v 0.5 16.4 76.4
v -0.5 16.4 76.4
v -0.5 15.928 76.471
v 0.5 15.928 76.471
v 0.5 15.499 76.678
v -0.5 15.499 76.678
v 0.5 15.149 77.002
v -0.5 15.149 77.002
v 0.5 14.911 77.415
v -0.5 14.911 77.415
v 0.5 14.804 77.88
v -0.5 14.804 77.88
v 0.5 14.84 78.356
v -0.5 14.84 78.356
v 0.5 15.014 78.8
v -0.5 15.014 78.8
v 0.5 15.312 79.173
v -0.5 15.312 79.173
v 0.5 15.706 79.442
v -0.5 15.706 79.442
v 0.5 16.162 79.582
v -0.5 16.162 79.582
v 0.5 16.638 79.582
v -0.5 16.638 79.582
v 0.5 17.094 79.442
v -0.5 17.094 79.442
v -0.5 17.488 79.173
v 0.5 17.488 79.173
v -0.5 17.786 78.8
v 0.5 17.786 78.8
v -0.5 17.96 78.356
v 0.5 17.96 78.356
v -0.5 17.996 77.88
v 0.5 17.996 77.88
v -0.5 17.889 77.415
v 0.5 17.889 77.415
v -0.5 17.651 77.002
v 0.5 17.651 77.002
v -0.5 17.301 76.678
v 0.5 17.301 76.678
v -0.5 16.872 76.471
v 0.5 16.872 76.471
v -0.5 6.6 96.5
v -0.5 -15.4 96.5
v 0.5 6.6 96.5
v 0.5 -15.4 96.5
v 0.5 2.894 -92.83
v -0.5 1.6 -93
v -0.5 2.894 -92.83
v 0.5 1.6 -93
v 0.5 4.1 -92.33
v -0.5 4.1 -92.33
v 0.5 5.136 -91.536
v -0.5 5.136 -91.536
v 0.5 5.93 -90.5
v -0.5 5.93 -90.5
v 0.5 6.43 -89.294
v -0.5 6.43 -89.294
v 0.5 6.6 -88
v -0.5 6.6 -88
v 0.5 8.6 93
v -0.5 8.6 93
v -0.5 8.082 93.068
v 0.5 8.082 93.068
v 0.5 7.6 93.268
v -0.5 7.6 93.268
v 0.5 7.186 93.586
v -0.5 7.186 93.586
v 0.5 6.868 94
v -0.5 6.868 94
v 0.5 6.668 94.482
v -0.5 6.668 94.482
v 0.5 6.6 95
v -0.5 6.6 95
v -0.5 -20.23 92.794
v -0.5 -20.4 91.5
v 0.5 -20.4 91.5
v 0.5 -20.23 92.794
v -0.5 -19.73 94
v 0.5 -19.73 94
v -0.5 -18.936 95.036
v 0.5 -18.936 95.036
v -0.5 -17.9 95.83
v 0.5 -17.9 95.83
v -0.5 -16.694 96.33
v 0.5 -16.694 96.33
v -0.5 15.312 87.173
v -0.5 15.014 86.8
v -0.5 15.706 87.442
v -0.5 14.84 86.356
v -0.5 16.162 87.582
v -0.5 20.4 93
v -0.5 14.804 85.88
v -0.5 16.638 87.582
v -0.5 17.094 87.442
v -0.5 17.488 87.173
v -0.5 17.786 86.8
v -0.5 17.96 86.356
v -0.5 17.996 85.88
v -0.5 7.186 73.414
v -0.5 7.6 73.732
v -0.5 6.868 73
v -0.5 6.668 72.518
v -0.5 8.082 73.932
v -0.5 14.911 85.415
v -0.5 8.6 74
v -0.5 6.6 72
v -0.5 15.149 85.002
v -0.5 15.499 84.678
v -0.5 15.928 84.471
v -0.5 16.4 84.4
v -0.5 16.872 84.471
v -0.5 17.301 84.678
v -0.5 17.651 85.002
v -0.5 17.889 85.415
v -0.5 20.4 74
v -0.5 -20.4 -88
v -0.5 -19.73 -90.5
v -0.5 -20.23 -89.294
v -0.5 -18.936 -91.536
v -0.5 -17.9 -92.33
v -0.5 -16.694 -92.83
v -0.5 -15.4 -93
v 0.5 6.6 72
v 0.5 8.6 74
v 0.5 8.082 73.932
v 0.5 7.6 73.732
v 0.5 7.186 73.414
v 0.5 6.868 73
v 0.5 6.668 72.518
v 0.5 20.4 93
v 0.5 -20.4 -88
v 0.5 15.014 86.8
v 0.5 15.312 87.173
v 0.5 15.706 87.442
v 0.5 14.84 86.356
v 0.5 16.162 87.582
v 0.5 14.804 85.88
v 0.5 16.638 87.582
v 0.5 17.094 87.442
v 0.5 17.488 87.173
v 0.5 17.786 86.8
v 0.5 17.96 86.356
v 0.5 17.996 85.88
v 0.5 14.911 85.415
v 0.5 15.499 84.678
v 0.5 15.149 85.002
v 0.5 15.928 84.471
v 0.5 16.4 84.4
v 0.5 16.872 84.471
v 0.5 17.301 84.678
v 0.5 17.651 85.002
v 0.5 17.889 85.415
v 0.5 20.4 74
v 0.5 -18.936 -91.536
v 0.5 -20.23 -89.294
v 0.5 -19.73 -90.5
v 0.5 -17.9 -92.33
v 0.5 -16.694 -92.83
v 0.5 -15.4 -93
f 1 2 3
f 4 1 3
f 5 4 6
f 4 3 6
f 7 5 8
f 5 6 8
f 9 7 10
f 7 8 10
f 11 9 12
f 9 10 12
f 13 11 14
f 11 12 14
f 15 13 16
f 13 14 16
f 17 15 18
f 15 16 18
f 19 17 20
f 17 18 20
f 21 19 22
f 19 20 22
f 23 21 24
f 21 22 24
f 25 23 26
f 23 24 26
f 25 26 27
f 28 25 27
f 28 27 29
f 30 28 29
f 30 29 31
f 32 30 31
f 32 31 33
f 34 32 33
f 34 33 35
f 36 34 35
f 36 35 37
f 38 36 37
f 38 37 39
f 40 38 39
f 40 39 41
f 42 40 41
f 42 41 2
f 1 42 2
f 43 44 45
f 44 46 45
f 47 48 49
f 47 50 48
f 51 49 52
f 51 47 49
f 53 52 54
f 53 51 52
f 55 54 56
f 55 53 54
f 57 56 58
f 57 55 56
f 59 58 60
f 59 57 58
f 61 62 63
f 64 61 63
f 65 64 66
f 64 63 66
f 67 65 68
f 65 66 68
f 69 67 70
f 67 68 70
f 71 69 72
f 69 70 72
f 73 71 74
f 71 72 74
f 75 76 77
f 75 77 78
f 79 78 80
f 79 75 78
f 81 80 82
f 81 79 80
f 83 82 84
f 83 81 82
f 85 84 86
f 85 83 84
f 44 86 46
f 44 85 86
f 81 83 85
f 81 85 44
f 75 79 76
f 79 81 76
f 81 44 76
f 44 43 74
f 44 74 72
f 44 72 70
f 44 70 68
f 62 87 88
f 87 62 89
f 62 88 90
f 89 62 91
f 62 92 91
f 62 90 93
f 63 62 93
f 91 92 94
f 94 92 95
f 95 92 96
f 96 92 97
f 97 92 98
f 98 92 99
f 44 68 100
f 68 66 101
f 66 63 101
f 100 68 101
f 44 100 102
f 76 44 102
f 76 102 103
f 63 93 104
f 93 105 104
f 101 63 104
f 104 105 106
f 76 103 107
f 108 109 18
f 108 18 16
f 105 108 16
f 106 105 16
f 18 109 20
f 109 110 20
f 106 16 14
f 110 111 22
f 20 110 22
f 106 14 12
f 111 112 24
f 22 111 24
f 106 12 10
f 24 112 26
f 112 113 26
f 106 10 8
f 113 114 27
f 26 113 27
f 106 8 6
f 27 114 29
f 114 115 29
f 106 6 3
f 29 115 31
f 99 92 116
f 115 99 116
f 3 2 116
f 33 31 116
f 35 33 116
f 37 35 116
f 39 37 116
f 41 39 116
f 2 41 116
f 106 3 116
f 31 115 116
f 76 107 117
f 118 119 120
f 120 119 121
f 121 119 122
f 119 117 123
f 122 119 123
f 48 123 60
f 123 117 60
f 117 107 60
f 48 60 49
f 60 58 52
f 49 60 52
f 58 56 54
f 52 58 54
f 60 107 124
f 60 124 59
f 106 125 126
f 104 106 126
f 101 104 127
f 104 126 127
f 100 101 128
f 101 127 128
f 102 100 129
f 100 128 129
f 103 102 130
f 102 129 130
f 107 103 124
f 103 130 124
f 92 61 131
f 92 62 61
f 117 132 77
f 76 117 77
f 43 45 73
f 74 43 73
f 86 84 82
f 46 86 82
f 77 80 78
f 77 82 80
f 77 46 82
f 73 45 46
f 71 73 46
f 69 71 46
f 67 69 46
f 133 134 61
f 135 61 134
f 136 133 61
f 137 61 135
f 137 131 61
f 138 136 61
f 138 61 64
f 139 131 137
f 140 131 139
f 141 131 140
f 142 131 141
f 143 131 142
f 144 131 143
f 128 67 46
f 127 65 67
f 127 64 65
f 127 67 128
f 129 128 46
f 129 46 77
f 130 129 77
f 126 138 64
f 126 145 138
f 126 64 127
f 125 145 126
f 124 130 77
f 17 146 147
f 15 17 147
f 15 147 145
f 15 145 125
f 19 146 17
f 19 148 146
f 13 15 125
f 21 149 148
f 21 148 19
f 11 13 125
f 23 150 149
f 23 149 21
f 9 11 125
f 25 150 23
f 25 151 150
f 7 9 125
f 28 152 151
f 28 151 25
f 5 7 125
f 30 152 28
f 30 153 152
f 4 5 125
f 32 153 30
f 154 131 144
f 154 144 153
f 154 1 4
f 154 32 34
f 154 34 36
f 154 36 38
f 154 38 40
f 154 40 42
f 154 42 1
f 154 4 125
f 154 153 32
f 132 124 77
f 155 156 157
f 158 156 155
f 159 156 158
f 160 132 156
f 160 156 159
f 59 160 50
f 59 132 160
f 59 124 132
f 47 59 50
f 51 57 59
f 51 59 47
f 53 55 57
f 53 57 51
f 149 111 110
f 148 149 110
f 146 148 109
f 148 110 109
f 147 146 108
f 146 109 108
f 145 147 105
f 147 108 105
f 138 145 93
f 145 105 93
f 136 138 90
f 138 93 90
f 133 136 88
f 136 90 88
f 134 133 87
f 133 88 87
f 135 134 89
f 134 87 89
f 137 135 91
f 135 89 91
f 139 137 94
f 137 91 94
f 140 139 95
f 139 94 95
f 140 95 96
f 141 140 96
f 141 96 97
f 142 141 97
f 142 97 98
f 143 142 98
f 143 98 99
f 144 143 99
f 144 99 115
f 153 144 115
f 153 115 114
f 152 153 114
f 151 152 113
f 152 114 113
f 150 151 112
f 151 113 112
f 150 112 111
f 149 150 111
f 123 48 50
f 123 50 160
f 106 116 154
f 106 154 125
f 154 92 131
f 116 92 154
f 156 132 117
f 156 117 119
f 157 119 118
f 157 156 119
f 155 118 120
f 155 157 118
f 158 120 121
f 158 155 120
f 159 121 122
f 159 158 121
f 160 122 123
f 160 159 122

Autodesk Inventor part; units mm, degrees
ref_plane "YZ Plane" through (0, 0, 0) normal (1, 0, 0) x (0, 1, 0)
ref_plane "XZ Plane" through (0, 0, 0) normal (0, 1, 0) x (-1, 0, 0)
ref_plane "XY Plane" through (0, 0, 0) normal (0, 0, 1) x (1, 0, 0)
sketch "スケッチ1" plane through (0, 0, 0) normal (1, 0, 0) x (0, 1, 0)
  line L0 (-20.4, 93) -> (20.4, 93)
  line L1 (20.4, 93) -> (20.4, -93)
  line L2 (20.4, -93) -> (-20.4, -93)
  line L3 (-20.4, -93) -> (-20.4, 93)
  line L4 (-20.4, 93) -> (20.4, -93) construction
  line L5 (20.4, 93) -> (-20.4, -93) construction
  line L6 (20.4, 93) -> (-20.4, 93)
  line L7 (-20.4, 93) -> (-20.4, 95)
  line L8 (-20.4, 95) -> (20.4, 95)
  line L9 (20.4, 95) -> (20.4, 93)
  point P0 (0, 0)
  dimension "d0" = 40.8
  dimension "d1" = 186
  dimension "d19" = 2
extrude "プレート1" add sketch "スケッチ1" along normal mid plane 1 contours L0 L1 L2 L3
sketch "スケッチ2" plane through (0.5, 0, 0) normal (1, 0, 0) x (0, 0, -1)
  line L0 (-93, 20.4) -> (93, 20.4) projected
  line L1 (-93, -20.4) -> (-93, 20.4) projected
  point P0 (0, 0)
  point P1 (-86, 16.4)
  point P2 (-78, 16.4)
  dimension "d3" = 4
  dimension "d4" = 7
  dimension "d5" = 8
hole "穴1" at (0.5, 16.4, 86) at (0.5, 16.4, 78) direction (-1, 0, 0) diameter 3.2 end through all clearance for "Socket Head Cap Screw" size "M3" standard "Ansi Metric M Profile"
sketch "スケッチ3" plane through (-0.5, 0, 0) normal (-1, 0, 0) x (0, 0, 1)
  line L0 (-93, 20.4) -> (-93, -20.4) projected
  line L1 (-93, 20.4) -> (74, 20.4)
  line L2 (74, 20.4) -> (74, 6.6)
  line L3 (74, 6.6) -> (-93, 6.6)
  line L4 (-93, 6.6) -> (-93, 20.4)
  line L5 (-93, -20.4) -> (93, -20.4) projected
  line L6 (93, -20.4) -> (93, 20.4) projected
  point P0 (0, 0)
  point P1 (-93, 6.6)
  dimension "d14" = 19
  dimension "d18" = 13.8
extrude "押し出し1" cut sketch "スケッチ3" against normal blind 10
sketch "スケッチ5" plane through (0.5, 0, 0) normal (1, 0, 0) x (0, 0, -1)
  line L0 (93, -20.4) -> (-93, -20.4)
  line L1 (-93, -20.4) -> (-96.5, -20.4)
  line L2 (-96.5, -20.4) -> (-96.5, 6.6)
  line L3 (-96.5, 6.6) -> (-93, 6.6)
  line L4 (-93, 6.6) -> (-93, -20.4)
  point P0 (0, 0)
  point P1 (-93, 20.4)
  dimension "d34" = 27
  dimension "d35" = 3.5
sheet face with bend "面3" sketch "スケッチ5" thickness 1 toward (-1, 0, 0) bend radius 1
bend "曲げ2"
fillet "コーナーR3" radius 5 3 edges at (0, -20.4, -93) (0, -20.4, 96.5) (0, 6.6, -93)
fillet "コーナーR4" radius 2 2 edges at (0, 6.6, 93) (0, 6.6, 74)
equation "\"d11\" = Thickness"
equation "\"d2\" = Thickness"
equation "\"d28\" = BendRadius"
equation "\"d29\" = BendReliefWidth"
equation "\"d31\" = MinimumRemnant"
equation "\"d30\" = BendReliefDepth"
equation "\"d32\" = TransitionRadius"
equation "\"BendRadius\" = Thickness"
equation "\"BendReliefWidth\" = Thickness"
equation "\"BendReliefDepth\" = 0.5 * Thickness"
equation "\"CornerReliefSize\" = 4 * Thickness"
equation "\"MinimumRemnant\" = 2 * Thickness"
equation "\"TransitionRadius\" = BendRadius"
equation "\"JacobiRadiusSize\" = BendRadius"
equation "\"GapSize\" = Thickness"
equation "\"Thickness\" = 1"
properties part number "s_carbon_plate2" material "CFRP"
